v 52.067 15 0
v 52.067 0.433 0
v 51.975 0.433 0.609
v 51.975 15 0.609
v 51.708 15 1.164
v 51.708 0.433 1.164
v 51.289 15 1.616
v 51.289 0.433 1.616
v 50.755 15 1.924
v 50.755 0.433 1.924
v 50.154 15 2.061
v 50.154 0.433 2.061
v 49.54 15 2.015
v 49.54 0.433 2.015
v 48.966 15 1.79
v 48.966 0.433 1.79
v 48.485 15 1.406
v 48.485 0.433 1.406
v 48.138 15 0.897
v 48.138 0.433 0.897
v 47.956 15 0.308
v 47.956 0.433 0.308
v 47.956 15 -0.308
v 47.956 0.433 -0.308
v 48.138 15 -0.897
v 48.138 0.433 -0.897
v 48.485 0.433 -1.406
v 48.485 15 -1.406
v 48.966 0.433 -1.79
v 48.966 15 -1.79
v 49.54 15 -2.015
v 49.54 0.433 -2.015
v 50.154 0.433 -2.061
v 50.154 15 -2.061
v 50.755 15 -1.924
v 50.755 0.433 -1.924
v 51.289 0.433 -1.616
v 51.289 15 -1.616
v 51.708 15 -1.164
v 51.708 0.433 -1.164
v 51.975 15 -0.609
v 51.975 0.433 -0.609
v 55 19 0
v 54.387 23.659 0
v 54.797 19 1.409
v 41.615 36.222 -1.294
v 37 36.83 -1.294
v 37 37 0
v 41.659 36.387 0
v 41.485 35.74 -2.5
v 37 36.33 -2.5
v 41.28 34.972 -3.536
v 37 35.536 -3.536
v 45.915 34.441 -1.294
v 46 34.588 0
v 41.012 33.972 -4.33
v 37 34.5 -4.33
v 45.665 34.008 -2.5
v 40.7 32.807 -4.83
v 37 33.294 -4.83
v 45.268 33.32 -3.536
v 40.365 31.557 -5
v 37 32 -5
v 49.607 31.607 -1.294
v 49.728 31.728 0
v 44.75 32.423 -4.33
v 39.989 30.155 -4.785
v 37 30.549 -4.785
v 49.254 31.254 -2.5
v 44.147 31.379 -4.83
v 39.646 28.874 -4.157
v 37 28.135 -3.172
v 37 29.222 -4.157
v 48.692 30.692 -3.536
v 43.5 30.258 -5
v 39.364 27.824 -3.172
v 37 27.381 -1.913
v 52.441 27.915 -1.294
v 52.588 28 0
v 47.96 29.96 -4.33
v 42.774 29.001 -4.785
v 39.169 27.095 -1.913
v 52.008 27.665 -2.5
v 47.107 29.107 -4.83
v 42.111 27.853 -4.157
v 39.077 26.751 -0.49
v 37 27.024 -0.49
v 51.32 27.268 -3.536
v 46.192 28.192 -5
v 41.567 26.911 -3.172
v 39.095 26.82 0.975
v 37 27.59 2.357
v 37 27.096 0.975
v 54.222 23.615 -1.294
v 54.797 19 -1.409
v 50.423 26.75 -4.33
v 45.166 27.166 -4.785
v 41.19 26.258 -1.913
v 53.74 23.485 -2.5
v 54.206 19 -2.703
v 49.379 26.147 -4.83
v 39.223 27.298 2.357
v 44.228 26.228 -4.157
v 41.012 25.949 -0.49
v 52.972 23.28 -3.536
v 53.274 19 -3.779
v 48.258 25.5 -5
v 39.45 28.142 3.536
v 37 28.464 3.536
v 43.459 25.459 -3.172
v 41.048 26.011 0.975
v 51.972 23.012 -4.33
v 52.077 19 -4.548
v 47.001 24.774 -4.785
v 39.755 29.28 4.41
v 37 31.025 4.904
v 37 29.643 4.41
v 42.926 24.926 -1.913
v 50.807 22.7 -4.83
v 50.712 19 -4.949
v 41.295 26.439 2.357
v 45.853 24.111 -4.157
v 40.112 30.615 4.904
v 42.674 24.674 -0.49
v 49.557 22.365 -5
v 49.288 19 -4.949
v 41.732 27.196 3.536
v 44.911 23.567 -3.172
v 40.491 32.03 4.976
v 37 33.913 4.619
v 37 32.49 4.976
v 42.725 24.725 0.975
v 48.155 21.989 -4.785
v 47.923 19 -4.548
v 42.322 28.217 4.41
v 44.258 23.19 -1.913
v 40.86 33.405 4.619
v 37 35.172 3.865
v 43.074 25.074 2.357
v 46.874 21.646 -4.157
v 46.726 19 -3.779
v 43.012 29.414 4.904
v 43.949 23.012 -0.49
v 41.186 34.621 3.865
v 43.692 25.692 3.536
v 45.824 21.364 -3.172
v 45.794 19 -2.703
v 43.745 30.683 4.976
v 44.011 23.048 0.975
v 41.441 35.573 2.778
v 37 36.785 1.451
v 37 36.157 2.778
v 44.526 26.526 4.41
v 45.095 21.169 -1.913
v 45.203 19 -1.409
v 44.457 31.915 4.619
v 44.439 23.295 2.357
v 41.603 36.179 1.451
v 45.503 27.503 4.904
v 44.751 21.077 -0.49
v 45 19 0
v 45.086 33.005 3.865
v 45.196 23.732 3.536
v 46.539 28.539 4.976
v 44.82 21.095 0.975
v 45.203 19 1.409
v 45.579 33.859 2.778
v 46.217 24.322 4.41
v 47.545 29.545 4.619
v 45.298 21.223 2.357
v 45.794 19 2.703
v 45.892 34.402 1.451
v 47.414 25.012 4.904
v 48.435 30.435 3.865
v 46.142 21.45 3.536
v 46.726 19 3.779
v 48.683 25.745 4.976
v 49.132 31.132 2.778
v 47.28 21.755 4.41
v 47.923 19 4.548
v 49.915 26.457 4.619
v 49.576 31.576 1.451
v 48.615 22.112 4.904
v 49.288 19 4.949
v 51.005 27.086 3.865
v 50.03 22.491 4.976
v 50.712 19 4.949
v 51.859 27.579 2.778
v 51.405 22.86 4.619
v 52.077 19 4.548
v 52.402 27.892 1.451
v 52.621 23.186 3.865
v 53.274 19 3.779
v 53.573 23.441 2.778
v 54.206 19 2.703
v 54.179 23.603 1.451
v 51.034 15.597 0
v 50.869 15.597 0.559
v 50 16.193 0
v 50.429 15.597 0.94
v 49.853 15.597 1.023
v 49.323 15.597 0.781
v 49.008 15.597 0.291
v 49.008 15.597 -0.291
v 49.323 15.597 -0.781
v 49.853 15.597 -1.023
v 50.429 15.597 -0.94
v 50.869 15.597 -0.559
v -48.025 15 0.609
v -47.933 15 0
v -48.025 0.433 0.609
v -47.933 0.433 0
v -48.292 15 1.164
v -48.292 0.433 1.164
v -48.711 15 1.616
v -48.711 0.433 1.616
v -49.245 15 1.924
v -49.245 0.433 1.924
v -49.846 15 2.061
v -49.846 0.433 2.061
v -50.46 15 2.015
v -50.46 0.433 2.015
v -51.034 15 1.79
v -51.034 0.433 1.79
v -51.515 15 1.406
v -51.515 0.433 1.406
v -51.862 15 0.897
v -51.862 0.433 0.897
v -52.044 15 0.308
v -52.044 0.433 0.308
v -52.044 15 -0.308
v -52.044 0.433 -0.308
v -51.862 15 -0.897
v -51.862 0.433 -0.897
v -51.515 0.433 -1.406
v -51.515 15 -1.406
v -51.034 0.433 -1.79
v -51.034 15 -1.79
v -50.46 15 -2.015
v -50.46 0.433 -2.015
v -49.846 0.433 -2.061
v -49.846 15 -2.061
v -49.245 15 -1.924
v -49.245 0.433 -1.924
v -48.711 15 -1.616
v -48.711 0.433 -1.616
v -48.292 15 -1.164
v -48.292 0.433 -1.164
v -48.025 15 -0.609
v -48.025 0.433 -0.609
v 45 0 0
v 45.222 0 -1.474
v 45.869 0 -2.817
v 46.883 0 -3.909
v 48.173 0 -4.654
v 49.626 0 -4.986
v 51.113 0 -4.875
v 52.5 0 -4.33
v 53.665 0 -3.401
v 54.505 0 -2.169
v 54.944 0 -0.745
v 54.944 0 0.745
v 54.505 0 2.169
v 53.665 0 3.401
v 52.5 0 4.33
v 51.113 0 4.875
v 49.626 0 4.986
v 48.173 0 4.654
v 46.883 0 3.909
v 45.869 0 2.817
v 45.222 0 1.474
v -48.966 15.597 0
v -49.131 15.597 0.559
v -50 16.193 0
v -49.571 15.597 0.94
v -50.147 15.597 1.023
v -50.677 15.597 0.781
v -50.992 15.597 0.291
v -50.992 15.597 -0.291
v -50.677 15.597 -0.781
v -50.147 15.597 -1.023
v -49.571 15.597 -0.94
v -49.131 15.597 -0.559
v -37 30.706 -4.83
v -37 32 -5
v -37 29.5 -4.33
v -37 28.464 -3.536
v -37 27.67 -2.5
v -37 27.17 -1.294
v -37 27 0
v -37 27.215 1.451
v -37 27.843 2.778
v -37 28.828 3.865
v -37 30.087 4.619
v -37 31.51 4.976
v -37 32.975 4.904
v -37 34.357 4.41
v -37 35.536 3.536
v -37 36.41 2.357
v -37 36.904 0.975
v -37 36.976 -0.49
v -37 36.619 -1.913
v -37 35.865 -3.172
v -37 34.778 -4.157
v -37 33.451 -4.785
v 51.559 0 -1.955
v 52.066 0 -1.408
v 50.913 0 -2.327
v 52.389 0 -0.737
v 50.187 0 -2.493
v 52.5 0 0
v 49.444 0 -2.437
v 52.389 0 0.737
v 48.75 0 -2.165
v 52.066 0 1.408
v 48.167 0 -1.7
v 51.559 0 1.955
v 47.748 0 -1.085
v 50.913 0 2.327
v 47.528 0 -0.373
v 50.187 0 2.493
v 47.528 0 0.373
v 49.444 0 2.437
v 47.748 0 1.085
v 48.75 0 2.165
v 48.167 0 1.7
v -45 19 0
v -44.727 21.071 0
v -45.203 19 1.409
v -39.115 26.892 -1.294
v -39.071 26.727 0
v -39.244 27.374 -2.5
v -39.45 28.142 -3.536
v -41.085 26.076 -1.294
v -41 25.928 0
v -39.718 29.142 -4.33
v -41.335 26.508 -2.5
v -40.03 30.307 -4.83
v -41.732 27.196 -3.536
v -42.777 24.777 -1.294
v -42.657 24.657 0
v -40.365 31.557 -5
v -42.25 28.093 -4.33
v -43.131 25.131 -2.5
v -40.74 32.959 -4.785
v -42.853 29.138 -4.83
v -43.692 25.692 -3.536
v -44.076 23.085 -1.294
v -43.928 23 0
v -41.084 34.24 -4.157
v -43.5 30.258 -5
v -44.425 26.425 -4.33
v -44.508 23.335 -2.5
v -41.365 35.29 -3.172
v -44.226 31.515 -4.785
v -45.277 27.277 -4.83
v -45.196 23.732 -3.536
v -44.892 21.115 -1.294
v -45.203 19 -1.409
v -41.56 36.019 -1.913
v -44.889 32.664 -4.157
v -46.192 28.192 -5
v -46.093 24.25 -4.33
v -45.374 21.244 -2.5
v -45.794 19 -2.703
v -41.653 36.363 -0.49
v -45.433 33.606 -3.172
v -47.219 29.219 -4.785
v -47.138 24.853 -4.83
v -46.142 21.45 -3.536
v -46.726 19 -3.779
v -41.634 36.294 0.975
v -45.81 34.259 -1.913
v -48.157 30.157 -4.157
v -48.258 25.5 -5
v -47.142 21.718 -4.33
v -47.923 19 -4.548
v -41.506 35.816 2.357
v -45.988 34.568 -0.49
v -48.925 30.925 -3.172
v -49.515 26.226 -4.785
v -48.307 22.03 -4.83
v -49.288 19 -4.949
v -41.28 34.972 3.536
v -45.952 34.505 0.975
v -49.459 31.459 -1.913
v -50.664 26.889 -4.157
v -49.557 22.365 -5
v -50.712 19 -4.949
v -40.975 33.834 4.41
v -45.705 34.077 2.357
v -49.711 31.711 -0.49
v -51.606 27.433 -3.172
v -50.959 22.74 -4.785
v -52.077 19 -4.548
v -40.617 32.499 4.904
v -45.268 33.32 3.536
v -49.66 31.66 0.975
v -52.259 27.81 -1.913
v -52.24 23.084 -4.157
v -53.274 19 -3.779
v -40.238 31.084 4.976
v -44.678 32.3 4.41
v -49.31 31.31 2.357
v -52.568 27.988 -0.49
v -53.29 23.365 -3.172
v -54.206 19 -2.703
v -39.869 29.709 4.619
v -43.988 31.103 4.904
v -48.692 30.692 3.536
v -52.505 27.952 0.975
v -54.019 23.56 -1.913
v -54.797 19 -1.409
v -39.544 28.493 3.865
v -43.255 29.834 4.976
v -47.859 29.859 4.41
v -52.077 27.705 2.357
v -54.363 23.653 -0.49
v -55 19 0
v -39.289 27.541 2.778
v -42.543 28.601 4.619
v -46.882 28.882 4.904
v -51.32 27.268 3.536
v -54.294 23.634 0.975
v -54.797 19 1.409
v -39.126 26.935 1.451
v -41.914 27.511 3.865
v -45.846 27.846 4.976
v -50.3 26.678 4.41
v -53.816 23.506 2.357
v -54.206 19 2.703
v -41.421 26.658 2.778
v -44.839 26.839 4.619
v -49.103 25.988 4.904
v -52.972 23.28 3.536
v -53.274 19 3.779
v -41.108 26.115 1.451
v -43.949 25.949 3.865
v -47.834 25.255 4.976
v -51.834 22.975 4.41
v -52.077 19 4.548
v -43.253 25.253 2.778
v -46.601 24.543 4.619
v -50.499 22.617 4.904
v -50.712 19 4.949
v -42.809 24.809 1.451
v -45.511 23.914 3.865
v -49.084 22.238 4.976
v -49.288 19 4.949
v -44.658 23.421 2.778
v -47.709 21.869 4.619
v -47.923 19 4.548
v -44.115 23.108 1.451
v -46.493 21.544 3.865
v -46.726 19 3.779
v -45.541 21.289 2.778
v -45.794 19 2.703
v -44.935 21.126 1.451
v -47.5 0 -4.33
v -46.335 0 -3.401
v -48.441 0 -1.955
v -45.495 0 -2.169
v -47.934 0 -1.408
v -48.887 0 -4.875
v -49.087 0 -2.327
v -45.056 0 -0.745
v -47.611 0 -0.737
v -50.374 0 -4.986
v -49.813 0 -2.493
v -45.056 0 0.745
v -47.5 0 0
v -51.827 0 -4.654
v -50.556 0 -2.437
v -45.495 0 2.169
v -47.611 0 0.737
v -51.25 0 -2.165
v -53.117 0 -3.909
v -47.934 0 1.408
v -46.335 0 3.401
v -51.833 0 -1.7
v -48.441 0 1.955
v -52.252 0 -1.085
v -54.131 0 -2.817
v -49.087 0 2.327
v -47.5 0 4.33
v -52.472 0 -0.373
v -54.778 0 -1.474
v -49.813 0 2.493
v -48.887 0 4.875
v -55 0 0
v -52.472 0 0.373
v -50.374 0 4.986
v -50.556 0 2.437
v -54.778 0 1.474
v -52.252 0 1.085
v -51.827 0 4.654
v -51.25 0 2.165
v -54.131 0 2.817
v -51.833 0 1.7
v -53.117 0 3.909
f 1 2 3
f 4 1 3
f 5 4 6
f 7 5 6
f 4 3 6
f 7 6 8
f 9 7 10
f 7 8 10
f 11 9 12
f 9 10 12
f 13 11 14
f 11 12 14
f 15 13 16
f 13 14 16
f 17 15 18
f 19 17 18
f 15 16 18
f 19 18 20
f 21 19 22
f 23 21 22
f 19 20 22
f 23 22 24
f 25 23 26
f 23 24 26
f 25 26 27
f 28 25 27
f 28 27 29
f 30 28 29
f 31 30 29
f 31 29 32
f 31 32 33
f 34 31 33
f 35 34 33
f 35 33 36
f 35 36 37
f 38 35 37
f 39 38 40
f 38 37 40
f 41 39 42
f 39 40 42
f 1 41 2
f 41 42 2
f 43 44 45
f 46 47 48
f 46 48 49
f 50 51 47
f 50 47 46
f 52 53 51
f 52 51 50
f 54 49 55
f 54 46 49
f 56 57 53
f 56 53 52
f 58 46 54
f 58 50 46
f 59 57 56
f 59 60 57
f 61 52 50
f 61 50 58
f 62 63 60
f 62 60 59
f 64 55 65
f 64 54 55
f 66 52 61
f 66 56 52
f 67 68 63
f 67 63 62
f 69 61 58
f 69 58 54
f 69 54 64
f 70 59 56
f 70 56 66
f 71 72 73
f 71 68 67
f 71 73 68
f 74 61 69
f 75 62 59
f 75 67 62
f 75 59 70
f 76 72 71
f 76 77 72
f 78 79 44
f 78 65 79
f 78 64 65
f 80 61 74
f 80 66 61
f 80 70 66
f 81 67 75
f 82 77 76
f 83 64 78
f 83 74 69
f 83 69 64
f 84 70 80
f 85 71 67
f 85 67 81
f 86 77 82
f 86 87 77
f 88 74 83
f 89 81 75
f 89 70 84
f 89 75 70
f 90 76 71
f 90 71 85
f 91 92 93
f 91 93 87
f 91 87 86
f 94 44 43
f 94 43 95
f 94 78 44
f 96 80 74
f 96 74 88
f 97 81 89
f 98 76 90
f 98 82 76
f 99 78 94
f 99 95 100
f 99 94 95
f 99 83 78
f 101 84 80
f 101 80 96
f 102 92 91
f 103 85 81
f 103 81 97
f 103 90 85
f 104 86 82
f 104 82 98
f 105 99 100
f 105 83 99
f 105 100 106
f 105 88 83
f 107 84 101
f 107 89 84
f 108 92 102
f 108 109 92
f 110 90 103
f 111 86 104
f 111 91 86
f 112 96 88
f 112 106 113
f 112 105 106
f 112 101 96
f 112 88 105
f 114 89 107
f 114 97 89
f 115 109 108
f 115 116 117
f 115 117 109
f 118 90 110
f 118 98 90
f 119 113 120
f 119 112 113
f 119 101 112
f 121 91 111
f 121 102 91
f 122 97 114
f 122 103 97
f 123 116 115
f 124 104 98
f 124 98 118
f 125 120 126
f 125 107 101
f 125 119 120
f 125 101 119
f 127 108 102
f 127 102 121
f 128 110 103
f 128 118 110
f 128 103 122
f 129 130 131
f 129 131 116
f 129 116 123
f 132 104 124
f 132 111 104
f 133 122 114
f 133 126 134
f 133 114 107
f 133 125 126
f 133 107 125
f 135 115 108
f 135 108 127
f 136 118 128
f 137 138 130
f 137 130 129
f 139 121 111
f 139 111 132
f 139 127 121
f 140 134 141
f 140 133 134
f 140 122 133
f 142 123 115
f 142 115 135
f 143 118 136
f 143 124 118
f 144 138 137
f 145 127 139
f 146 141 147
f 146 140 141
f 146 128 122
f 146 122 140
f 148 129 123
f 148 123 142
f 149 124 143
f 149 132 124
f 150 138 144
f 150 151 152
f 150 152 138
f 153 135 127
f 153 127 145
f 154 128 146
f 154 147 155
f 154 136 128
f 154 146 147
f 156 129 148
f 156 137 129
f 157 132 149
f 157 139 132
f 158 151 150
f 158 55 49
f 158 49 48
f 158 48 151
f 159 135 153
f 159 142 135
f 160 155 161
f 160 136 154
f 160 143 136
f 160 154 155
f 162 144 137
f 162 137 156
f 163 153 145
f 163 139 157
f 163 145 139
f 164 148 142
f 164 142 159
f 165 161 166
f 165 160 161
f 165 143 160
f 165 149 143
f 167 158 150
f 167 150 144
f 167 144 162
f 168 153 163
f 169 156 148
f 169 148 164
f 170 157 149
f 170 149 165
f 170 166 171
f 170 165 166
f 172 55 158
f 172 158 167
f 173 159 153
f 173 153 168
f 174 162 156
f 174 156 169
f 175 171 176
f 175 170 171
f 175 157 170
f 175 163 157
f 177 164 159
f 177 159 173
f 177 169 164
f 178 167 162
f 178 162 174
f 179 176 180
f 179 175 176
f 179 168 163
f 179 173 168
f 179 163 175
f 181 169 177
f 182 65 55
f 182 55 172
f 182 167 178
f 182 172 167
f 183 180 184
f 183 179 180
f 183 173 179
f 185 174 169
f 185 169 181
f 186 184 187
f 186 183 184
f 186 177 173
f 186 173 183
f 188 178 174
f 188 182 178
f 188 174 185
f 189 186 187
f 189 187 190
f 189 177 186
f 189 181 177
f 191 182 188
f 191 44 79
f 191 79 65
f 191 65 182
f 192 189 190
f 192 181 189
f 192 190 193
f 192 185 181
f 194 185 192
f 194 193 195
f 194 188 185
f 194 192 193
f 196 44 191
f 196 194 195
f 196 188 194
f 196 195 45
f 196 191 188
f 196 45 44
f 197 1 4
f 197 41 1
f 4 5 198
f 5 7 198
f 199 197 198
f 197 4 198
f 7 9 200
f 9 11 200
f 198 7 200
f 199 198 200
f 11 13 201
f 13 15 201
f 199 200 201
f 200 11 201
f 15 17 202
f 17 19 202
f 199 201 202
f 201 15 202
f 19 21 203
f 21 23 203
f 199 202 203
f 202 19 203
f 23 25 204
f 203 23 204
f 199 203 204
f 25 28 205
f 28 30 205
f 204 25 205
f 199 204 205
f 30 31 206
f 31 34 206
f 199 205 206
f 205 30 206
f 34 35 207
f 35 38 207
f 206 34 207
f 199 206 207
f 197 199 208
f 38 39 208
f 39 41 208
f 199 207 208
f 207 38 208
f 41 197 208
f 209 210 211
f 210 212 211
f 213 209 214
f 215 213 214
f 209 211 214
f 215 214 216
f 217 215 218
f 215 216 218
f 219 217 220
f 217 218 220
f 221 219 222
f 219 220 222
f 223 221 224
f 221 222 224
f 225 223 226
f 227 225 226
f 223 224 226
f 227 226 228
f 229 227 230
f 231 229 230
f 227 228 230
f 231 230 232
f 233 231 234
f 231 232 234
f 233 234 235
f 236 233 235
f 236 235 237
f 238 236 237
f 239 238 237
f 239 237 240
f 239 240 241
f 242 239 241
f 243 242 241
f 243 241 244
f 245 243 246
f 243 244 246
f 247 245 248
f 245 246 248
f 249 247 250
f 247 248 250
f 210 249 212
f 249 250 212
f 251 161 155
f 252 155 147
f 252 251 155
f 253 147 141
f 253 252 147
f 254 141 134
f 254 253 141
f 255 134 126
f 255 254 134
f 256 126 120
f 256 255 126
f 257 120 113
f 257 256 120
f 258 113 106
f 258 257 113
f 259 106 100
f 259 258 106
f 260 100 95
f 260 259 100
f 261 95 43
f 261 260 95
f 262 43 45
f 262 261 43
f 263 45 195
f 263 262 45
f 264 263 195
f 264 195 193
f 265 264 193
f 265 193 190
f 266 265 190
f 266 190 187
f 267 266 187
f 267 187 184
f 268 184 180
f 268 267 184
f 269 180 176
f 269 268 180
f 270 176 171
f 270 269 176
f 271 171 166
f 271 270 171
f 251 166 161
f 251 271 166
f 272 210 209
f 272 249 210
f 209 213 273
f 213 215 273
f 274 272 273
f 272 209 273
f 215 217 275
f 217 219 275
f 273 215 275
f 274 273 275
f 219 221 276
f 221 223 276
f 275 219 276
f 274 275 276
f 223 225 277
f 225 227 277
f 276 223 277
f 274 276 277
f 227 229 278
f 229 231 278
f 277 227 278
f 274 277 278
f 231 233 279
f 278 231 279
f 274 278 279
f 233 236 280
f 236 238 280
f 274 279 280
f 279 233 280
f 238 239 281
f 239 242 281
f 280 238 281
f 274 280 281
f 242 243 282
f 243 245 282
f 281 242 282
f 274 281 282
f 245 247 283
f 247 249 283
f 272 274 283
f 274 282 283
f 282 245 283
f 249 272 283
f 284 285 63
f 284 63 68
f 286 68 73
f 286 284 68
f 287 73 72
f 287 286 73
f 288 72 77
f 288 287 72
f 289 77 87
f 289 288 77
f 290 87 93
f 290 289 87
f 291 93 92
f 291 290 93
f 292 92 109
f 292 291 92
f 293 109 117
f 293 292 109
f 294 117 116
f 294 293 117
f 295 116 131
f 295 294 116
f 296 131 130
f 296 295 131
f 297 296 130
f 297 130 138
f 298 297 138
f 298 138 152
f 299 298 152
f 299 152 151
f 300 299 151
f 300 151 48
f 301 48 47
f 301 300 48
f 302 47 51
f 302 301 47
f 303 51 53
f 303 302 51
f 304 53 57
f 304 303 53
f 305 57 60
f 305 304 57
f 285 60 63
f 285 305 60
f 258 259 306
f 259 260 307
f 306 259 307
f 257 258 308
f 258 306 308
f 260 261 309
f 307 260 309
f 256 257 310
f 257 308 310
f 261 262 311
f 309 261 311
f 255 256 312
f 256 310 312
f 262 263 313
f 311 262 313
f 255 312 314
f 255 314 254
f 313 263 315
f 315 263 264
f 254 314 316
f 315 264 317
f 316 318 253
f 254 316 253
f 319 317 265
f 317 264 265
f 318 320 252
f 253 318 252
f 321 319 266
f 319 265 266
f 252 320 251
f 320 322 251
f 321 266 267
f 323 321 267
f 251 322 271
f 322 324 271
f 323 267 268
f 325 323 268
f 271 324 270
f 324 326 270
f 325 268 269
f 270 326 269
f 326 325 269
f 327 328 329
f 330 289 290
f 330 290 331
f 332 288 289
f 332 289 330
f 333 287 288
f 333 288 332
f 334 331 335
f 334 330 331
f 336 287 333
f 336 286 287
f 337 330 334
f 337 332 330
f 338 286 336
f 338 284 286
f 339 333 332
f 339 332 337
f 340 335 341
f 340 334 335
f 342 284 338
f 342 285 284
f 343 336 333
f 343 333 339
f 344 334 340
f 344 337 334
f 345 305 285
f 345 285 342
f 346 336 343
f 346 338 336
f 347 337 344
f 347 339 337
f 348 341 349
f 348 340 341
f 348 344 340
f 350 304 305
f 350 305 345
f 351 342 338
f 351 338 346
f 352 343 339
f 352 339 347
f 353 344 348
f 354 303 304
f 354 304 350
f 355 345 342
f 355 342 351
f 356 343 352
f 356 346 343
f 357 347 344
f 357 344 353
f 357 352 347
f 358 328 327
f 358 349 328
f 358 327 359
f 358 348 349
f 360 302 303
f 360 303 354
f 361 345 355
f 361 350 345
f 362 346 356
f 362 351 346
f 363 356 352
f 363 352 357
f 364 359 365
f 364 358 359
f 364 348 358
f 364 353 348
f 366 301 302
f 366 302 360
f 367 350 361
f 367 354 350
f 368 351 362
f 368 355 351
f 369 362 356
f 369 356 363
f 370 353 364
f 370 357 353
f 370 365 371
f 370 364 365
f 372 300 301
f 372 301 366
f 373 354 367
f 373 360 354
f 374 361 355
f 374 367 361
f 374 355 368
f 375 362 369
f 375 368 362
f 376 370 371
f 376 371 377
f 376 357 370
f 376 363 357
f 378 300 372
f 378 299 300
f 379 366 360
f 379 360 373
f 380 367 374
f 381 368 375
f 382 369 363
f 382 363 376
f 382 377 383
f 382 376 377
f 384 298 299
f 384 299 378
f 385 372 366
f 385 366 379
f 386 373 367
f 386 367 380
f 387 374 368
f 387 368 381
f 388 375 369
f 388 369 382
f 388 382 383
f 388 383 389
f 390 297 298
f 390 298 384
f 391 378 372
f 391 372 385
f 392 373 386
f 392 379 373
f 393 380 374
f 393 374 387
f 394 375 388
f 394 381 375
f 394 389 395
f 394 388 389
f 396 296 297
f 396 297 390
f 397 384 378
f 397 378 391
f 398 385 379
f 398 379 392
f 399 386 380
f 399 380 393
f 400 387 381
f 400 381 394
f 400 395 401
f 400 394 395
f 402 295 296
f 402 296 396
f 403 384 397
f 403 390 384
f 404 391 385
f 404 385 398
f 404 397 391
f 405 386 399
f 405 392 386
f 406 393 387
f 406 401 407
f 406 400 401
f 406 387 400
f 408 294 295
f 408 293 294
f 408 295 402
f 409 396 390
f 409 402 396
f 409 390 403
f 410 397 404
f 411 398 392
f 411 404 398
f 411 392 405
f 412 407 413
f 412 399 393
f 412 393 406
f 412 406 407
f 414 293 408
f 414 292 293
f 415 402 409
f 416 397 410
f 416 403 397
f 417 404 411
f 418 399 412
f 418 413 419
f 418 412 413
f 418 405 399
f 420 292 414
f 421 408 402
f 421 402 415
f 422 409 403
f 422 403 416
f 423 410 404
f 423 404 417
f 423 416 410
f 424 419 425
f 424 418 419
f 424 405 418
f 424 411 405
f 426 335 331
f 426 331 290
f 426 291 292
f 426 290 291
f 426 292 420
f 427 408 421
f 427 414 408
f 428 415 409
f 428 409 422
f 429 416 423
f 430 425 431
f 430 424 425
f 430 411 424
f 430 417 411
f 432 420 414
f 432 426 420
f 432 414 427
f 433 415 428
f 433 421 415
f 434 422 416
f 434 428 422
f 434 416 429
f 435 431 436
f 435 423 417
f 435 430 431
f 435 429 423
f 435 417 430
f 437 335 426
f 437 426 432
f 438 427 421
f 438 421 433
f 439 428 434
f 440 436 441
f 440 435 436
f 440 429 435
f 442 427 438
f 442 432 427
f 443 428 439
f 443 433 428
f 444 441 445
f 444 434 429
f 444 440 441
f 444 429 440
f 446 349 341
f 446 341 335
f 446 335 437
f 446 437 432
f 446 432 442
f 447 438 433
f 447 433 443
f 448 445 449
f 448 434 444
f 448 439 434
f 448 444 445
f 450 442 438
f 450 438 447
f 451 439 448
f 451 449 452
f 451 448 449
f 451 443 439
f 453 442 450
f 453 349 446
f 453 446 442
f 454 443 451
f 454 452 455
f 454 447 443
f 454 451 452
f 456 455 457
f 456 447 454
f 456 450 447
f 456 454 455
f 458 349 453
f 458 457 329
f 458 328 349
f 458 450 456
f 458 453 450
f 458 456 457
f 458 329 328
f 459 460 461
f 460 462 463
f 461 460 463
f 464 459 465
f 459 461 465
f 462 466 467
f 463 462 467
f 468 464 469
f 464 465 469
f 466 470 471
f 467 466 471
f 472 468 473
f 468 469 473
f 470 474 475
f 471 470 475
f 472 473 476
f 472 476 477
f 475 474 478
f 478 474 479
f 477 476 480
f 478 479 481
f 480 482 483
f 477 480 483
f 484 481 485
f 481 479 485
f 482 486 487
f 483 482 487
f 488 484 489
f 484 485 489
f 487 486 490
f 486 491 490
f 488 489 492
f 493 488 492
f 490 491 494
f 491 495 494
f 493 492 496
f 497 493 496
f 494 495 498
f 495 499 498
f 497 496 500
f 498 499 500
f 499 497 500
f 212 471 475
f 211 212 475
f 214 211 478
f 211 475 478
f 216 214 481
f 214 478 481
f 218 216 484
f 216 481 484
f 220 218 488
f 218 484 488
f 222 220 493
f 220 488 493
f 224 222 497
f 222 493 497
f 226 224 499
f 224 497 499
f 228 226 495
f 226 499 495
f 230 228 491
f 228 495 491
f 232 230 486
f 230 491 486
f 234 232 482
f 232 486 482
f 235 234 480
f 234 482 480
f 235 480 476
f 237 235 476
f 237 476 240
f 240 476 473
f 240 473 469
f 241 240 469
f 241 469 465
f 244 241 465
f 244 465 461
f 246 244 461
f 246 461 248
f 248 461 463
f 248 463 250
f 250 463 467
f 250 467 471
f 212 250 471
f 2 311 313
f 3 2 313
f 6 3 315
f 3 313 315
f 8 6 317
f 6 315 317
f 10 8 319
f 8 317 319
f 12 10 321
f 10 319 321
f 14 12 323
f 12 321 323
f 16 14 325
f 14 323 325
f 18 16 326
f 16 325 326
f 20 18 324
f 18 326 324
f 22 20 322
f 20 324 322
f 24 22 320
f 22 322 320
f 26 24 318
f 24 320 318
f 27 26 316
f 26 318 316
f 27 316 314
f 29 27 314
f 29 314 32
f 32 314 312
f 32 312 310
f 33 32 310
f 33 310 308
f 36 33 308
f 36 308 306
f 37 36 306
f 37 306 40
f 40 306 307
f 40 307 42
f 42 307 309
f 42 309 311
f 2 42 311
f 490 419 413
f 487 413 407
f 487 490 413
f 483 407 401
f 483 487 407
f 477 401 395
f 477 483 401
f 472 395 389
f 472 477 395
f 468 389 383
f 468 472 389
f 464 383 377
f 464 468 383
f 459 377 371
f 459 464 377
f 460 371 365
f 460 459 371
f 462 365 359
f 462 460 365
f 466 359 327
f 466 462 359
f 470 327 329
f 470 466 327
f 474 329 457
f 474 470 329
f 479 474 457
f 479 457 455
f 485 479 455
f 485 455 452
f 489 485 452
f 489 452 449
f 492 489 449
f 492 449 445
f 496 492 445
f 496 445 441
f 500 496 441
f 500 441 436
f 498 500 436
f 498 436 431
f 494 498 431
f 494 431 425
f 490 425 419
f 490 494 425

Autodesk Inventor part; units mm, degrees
sketch "Sketch_1" plane through (0, 0, 0) normal (0, 1, 0) x (-1, 0, 0)
  circle A0 centre (50, 0) radius 5
extrude "Extrusion1" add sketch "Sketch_1" along normal blind 19
sketch "Sketch_2" plane through (0, 19, 0) normal (0, 1, 0) x (1, 0, 0)
  line L0 (-37, 5) -> (-37, -5)
  circle A0 centre (-50, 0) radius 5
revolve "Revolution1" add sketch "Sketch_2" angle 90 about axis through (-37, 19, -5) along (0, 0, -1)
sketch "Sketch_3" plane through (-37, 0, 0) normal (1, 0, 0) x (0, 0, -1)
  circle A0 centre (0, 32) radius 5
extrude "Extrusion2" add sketch "Sketch_3" along normal blind 74
sketch "Sketch_4" plane through (0, 19, 0) normal (0, 1, 0) x (1, 0, 0)
  line L0 (37, -5) -> (37, 5)
  circle A0 centre (50, 0) radius 5
revolve "Revolution2" add sketch "Sketch_4" angle 90 about axis through (37, 19, 5) along (0, 0, 1)
sketch "Sketch_5" plane through (0, 0, 0) normal (0, 1, 0) x (-1, 0, 0)
  circle A0 centre (-50, 0) radius 5
extrude "Extrusion3" add sketch "Sketch_5" along normal blind 19
sketch "Sketch_6" plane through (0, 0, 0) normal (0, 0, 1) x (1, 0, 0)
  line L0 (-50, 0) -> (-50, 16.1934)
  line L1 (-50, 16.1934) -> (-47.933, 15)
  line L2 (-47.933, 15) -> (-47.933, 0.433)
  line L3 (-47.933, 0.433) -> (-47.5, 0)
  line L4 (-47.5, 0) -> (-50, 0)
  line L5 (-50, 0) -> (-50, 16.1934)
revolve "Revolution3" cut sketch "Sketch_6" angle 360 about axis through (-50, 0, 0) along (0, -1, 0)
thread "Thread1" size "M5x0.8" class "6H" standard "ISO Metric profile" length 13 offset 2
sketch "Sketch_7" plane through (0, 0, 0) normal (0, 0, 1) x (1, 0, 0)
  line L0 (50, 0) -> (50, 16.1934)
  line L1 (50, 16.1934) -> (52.067, 15)
  line L2 (52.067, 15) -> (52.067, 0.433)
  line L3 (52.067, 0.433) -> (52.5, 0)
  line L4 (52.5, 0) -> (50, 0)
  line L5 (50, 0) -> (50, 16.1934)
revolve "Revolution4" cut sketch "Sketch_7" angle 360 about axis through (50, 0, 0) along (0, -1, 0)
thread "Thread2" size "M5x0.8" class "6H" standard "ISO Metric profile" length 13 offset 2
ref_plane "bolt1_XY" through (-50, 0, 0) normal (0, 1, 0) x (1, 0, 0)
ref_plane "bolt1_YZ" through (-50, 0, 0) normal (1, 0, 0) x (0, 0, -1)
ref_plane "bolt1_ZX" through (-50, 0, 0) normal (0, 0, -1) x (0, 1, 0)
ref_plane "bolt2_XY" through (50, 0, 0) normal (0, 1, 0) x (1, 0, 0)
ref_plane "bolt2_YZ" through (50, 0, 0) normal (1, 0, 0) x (0, 0, -1)
ref_plane "bolt2_ZX" through (50, 0, 0) normal (0, 0, -1) x (0, 1, 0)
properties part number "UWANGF_pull100-5"
